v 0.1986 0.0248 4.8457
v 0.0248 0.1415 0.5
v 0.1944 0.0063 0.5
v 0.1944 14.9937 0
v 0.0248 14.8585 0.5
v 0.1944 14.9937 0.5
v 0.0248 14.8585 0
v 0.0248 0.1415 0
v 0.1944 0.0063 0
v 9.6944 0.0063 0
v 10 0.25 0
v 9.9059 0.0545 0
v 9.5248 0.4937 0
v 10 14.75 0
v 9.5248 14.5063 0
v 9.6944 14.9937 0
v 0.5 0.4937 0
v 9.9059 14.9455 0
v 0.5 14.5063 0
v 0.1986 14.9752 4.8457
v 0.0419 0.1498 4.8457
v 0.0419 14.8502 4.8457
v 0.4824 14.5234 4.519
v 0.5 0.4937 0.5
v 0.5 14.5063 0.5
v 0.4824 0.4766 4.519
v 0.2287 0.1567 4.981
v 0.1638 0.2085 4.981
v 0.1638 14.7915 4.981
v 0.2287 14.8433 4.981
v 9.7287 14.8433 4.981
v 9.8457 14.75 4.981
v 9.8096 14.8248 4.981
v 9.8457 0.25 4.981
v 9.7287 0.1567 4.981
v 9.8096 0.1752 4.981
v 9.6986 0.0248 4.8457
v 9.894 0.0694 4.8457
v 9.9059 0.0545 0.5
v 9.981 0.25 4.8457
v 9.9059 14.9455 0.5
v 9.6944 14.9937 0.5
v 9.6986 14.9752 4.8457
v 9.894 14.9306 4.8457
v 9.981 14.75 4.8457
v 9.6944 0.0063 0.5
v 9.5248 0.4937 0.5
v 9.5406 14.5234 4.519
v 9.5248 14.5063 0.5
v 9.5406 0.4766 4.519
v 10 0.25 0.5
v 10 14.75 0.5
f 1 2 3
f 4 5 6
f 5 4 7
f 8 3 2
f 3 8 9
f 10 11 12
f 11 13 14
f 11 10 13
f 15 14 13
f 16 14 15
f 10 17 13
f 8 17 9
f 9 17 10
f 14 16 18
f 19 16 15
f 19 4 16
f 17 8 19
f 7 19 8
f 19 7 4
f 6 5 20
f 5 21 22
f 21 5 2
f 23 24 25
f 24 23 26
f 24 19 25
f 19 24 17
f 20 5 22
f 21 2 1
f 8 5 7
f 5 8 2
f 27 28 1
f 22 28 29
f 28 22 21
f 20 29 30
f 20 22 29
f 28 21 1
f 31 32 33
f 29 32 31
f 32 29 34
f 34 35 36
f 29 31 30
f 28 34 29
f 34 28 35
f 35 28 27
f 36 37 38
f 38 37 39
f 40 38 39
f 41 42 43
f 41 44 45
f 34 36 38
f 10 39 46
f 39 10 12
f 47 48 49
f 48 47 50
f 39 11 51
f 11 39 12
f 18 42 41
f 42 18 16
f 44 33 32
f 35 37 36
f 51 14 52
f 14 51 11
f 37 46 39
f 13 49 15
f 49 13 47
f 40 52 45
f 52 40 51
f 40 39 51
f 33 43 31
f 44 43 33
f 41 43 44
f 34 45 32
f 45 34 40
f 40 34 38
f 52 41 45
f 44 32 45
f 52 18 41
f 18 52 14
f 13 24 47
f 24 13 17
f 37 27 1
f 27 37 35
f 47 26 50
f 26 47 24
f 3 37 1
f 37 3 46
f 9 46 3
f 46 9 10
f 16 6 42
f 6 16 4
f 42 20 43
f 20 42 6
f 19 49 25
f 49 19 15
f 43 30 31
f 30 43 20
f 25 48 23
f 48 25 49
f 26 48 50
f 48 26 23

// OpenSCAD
$fn=7;
union()
{
	union()
	{
		hull()
		{
			translate([0.25,0.25,0])
			{
				rotate(0,[0,0,1])
				{
					cylinder(h=0.5,d=0.5);
				}
			}
			translate([0.25,0.25,4.75])
			{
				rotate(0,[0,0,1])
				{
					sphere(d=0.5);
				}
			}
			translate([0.25,14.75,4.75])
			{
				rotate(0,[0,0,1])
				{
					sphere(d=0.5);
				}
			}
			translate([0.25,14.75,0])
			{
				rotate(0,[0,0,1])
				{
					cylinder(h=0.5,d=0.5);
				}
			}
		}
		hull()
		{
			translate([9.75,0.25,0])
			{
				rotate(0,[0,0,1])
				{
					cylinder(h=0.5,d=0.5);
				}
			}
			translate([9.75,0.25,4.75])
			{
				rotate(0,[0,0,1])
				{
					sphere(d=0.5);
				}
			}
			translate([9.75,14.75,4.75])
			{
				rotate(0,[0,0,1])
				{
					sphere(d=0.5);
				}
			}
			translate([9.75,14.75,0])
			{
				rotate(0,[0,0,1])
				{
					cylinder(h=0.5,d=0.5);
				}
			}
		}
		hull()
		{
			translate([0.25,0.25,0])
			{
				rotate(0,[0,0,1])
				{
					cylinder(h=0.5,d=0.5);
				}
			}
			translate([0.25,0.25,4.75])
			{
				rotate(0,[0,0,1])
				{
					sphere(d=0.5);
				}
			}
			translate([9.75,0.25,4.75])
			{
				rotate(0,[0,0,1])
				{
					sphere(d=0.5);
				}
			}
			translate([9.75,0.25,0])
			{
				rotate(0,[0,0,1])
				{
					cylinder(h=0.5,d=0.5);
				}
			}
		}
		hull()
		{
			translate([0.25,14.75,0])
			{
				rotate(0,[0,0,1])
				{
					cylinder(h=0.5,d=0.5);
				}
			}
			translate([0.25,14.75,4.75])
			{
				rotate(0,[0,0,1])
				{
					sphere(d=0.5);
				}
			}
			translate([9.75,14.75,4.75])
			{
				rotate(0,[0,0,1])
				{
					sphere(d=0.5);
				}
			}
			translate([9.75,14.75,0])
			{
				rotate(0,[0,0,1])
				{
					cylinder(h=0.5,d=0.5);
				}
			}
		}
	}
	hull()
	{
		translate([0.25,0.25,4.75])
		{
			rotate(0,[0,0,1])
			{
				sphere(d=0.5);
			}
		}
		translate([0.25,14.75,4.75])
		{
			rotate(0,[0,0,1])
			{
				sphere(d=0.5);
			}
		}
		translate([9.75,14.75,4.75])
		{
			rotate(0,[0,0,1])
			{
				sphere(d=0.5);
			}
		}
		translate([9.75,0.25,4.75])
		{
			rotate(0,[0,0,1])
			{
				sphere(d=0.5);
			}
		}
	}
}
